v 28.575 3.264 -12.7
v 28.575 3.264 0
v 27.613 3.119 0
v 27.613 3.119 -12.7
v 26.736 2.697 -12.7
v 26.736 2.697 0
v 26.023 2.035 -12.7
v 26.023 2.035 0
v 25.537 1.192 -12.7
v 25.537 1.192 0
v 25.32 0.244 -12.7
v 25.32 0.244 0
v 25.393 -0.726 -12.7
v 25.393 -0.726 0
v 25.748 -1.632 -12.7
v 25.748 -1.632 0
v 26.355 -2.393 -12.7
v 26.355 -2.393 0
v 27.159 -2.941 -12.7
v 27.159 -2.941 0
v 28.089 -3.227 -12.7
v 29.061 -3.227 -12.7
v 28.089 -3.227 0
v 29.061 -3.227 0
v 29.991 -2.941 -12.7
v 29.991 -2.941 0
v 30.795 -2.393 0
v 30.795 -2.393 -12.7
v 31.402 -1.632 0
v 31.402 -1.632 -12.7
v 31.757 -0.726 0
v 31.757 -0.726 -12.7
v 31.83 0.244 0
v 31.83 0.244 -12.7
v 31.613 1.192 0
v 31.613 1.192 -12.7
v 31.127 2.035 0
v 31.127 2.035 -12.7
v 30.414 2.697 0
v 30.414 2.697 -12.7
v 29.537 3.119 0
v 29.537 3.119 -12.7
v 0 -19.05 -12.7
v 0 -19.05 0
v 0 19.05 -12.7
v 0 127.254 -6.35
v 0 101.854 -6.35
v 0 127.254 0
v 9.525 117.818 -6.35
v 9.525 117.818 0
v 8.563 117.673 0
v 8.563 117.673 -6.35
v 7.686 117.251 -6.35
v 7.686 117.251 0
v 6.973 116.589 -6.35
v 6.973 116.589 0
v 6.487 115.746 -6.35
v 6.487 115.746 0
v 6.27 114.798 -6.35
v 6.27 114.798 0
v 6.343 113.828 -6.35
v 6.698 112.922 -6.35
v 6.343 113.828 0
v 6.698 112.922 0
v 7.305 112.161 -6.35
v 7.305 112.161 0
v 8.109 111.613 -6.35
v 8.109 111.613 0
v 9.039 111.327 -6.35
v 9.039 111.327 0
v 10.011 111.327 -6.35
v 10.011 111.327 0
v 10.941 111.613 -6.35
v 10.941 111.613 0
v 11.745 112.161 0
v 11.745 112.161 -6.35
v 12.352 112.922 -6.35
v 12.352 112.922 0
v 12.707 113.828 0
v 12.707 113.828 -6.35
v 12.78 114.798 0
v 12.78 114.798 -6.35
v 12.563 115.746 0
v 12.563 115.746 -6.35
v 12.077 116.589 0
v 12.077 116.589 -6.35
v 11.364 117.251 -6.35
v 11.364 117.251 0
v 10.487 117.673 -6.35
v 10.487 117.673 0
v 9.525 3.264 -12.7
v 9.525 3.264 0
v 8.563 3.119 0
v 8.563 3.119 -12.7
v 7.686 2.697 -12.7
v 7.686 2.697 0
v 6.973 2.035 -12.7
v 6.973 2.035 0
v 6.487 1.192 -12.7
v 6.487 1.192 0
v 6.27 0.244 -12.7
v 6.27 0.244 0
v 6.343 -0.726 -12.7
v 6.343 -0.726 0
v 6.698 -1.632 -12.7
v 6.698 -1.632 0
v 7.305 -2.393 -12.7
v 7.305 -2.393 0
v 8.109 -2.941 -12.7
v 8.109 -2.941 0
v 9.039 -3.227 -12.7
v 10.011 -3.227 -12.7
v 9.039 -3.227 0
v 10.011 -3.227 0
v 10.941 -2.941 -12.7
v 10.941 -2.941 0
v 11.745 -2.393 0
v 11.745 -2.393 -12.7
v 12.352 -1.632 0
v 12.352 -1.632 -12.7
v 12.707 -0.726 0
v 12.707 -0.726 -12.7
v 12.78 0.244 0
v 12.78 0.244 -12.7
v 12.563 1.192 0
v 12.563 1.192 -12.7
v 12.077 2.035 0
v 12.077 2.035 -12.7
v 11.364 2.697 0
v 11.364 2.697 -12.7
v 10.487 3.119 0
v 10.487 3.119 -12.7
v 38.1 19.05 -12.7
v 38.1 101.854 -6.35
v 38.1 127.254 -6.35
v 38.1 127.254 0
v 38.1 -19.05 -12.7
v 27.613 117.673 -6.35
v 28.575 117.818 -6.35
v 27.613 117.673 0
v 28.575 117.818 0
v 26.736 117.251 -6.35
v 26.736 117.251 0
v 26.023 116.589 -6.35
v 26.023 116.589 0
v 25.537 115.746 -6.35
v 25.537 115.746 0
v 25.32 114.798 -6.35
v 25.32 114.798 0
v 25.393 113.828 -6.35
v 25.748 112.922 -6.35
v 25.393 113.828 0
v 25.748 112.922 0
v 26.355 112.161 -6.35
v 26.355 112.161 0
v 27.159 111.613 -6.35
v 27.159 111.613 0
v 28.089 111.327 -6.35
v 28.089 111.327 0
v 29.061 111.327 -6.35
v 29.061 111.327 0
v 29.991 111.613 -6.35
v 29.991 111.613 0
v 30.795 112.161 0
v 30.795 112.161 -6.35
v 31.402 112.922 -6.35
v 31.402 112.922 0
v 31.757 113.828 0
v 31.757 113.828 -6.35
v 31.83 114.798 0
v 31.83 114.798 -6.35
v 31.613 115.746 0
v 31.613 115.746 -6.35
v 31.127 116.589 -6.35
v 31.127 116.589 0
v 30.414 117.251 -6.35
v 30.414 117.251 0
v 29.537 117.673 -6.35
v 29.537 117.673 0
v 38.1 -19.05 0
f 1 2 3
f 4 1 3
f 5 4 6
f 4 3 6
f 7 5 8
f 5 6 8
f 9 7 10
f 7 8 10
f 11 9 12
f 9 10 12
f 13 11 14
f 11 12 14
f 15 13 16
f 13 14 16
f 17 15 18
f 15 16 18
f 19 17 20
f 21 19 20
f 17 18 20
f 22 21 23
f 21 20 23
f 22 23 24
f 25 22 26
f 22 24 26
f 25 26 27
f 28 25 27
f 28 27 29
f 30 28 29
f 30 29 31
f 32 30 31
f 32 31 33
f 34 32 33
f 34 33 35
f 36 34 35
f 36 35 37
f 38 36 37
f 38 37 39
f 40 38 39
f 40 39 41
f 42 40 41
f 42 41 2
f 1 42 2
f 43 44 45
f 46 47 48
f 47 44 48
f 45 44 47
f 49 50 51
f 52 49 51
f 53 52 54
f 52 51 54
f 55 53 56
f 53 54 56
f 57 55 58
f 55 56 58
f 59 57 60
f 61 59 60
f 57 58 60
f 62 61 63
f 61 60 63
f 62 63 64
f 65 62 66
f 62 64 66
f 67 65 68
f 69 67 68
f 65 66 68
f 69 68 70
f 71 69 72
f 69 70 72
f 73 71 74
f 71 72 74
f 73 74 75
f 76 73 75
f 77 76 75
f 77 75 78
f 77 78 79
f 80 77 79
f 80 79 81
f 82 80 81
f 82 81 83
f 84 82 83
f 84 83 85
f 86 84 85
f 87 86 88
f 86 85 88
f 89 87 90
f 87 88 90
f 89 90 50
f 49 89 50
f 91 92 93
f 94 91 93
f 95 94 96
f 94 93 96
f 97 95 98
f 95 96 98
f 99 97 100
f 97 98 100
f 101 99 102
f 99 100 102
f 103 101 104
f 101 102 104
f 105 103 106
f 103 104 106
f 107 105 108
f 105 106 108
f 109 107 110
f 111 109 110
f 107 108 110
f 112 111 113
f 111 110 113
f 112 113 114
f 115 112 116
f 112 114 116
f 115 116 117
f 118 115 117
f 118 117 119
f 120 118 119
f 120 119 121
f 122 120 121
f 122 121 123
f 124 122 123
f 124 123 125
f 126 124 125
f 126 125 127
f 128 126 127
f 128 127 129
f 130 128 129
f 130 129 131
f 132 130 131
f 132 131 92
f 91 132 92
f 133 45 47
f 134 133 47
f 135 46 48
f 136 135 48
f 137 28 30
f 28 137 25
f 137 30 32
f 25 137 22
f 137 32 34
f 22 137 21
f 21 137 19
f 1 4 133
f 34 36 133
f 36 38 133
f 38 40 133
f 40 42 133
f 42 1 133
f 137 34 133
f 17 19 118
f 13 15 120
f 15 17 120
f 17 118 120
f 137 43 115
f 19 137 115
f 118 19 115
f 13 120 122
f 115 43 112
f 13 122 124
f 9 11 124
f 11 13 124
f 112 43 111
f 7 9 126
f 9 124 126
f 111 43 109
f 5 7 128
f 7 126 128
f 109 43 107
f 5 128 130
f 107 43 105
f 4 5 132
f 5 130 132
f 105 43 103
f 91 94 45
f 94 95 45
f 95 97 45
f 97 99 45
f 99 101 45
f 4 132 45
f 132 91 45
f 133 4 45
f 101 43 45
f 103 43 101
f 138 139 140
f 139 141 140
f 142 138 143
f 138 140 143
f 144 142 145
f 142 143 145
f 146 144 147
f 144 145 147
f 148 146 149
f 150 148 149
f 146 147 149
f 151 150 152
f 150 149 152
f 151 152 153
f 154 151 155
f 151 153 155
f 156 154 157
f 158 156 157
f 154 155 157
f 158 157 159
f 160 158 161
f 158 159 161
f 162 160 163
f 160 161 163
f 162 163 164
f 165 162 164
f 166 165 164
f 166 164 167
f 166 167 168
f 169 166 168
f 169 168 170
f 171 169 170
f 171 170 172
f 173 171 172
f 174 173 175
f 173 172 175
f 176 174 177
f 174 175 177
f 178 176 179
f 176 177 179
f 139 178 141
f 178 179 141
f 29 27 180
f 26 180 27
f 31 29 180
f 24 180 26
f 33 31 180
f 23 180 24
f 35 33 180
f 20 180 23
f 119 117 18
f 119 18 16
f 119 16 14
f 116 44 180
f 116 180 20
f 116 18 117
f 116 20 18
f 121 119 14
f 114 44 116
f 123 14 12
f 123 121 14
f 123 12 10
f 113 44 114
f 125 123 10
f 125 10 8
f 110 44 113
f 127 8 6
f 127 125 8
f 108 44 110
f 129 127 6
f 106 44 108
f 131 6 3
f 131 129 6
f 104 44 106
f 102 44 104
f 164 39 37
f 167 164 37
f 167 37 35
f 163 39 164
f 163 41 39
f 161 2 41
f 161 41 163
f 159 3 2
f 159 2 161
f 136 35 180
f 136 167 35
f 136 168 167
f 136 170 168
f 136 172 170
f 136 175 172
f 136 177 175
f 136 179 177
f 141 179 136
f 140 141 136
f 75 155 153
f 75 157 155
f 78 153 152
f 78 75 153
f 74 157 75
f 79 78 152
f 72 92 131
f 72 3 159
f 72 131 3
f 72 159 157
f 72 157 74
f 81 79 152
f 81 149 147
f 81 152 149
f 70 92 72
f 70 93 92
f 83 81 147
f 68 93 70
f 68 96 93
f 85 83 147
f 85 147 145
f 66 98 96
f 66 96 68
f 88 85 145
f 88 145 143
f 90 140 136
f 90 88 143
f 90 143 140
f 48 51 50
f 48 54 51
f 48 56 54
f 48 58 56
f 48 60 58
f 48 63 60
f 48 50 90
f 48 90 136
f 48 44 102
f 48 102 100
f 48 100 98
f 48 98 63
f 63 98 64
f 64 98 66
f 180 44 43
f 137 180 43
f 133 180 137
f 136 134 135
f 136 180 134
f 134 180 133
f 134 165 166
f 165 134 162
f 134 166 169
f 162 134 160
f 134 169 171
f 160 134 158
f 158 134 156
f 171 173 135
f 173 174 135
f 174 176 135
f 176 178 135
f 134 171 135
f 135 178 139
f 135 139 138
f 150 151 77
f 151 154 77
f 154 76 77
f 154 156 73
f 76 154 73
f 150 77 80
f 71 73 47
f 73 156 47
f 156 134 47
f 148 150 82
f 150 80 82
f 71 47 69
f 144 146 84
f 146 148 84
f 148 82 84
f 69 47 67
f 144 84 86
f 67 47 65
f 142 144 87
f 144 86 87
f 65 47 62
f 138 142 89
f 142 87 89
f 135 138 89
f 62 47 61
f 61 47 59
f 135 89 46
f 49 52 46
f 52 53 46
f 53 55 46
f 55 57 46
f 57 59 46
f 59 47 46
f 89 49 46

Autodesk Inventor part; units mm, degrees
ref_plane "YZ Plane" through (0, 0, 0) normal (1, 0, 0) x (0, 1, 0)
ref_plane "XZ Plane" through (0, 0, 0) normal (0, 1, 0) x (-1, 0, 0)
ref_plane "XY Plane" through (0, 0, 0) normal (0, 0, 1) x (1, 0, 0)
sketch "Sketch1" plane through (0, 0, 0) normal (1, 0, 0) x (0, 1, 0)
  line L0 (0, 0) -> (114.554, 0)
  line L1 (0, 0) -> (-19.05, 0)
  line L2 (-19.05, 0) -> (-19.05, -12.7)
  line L3 (-19.05, -12.7) -> (19.05, -12.7)
  line L4 (101.854, -6.35) -> (114.554, -6.35)
  line L5 (114.554, -6.35) -> (127.254, -6.35)
  line L6 (127.254, -6.35) -> (127.254, 0)
  line L7 (127.254, 0) -> (114.554, 0)
  line L8 (114.554, 0) -> (114.554, -6.35) construction
  line L9 (101.854, 0) -> (101.854, -6.35) construction
  line L10 (19.05, -12.7) -> (101.854, -6.35)
  dimension "d0" = 114.554
  dimension "d1" = 19.05
  dimension "d2" = 12.7
  dimension "d3" = 38.1
  dimension "d4" = 12.7
  dimension "d5" = 25.4
  dimension "d6" = 6.35
extrude "Extrusion1" add sketch "Sketch1" along normal blind 38.1
sketch "Sketch2" plane through (0, -19.05, -12.7) normal (0, 0, -1) x (-1, 0, 0)
  line L0 (0, 38.1) -> (0, 0) projected
  line L1 (0, 38.1) -> (-38.1, 38.1) projected
  line L2 (-38.1, 0) -> (-38.1, 38.1) projected
  line L3 (0, 0) -> (-38.1, 0) projected
  line L4 (0, 19.05) -> (-38.1, 19.05) construction
  line L5 (-28.575, 38.1) -> (-28.575, 0) construction
  line L6 (-9.525, 38.1) -> (-9.525, 32.2712) construction
  line L7 (-9.525, 32.2712) -> (-9.525, 0) construction
  point P0 (-28.575, 19.05)
  point P1 (-9.525, 19.05)
  dimension "d9" = 9.525
  dimension "d10" = 9.525
sketch "Sketch3" plane through (0, 101.854, -6.35) normal (0, 0, -1) x (-1, 0, 0)
  line L0 (0, 25.4) -> (0, 0) projected
  line L1 (0, 25.4) -> (-38.1, 25.4) projected
  line L2 (-38.1, 0) -> (-38.1, 25.4) projected
  line L3 (0, 0) -> (-38.1, 0) projected
  line L4 (-38.1, 12.7) -> (0, 12.7) construction
  line L5 (-28.575, 25.4) -> (-28.575, 0) construction
  line L6 (-9.525, 25.4) -> (-9.525, 0) construction
  point P0 (0, -101.854)
  point P1 (-28.575, 12.7)
  point P2 (-9.525, 12.7)
  dimension "d11" = 9.525
  dimension "d12" = 9.525
hole "Hole1" at (9.525, 0, -12.7) at (28.575, 0, -12.7) direction (0, 0, 1) diameter 6.5278 end through all clearance for "Flat Head Machine Screw (82)" size "1/4" standard "Ansi Unified Screw Threads"
hole "Hole2" at (28.575, 114.554, -6.35) at (9.525, 114.554, -6.35) direction (0, 0, 1) diameter 6.5278 end through all clearance for "Flat Head Machine Screw (82)" size "1/4" standard "Ansi Unified Screw Threads"
fillet_without_effect "Fillet1"
equation "\"d9\" = d10"
equation "\"d12\" = d11"
properties part number "Y_shaft_support_brace_A" material "Aluminum 6061"
